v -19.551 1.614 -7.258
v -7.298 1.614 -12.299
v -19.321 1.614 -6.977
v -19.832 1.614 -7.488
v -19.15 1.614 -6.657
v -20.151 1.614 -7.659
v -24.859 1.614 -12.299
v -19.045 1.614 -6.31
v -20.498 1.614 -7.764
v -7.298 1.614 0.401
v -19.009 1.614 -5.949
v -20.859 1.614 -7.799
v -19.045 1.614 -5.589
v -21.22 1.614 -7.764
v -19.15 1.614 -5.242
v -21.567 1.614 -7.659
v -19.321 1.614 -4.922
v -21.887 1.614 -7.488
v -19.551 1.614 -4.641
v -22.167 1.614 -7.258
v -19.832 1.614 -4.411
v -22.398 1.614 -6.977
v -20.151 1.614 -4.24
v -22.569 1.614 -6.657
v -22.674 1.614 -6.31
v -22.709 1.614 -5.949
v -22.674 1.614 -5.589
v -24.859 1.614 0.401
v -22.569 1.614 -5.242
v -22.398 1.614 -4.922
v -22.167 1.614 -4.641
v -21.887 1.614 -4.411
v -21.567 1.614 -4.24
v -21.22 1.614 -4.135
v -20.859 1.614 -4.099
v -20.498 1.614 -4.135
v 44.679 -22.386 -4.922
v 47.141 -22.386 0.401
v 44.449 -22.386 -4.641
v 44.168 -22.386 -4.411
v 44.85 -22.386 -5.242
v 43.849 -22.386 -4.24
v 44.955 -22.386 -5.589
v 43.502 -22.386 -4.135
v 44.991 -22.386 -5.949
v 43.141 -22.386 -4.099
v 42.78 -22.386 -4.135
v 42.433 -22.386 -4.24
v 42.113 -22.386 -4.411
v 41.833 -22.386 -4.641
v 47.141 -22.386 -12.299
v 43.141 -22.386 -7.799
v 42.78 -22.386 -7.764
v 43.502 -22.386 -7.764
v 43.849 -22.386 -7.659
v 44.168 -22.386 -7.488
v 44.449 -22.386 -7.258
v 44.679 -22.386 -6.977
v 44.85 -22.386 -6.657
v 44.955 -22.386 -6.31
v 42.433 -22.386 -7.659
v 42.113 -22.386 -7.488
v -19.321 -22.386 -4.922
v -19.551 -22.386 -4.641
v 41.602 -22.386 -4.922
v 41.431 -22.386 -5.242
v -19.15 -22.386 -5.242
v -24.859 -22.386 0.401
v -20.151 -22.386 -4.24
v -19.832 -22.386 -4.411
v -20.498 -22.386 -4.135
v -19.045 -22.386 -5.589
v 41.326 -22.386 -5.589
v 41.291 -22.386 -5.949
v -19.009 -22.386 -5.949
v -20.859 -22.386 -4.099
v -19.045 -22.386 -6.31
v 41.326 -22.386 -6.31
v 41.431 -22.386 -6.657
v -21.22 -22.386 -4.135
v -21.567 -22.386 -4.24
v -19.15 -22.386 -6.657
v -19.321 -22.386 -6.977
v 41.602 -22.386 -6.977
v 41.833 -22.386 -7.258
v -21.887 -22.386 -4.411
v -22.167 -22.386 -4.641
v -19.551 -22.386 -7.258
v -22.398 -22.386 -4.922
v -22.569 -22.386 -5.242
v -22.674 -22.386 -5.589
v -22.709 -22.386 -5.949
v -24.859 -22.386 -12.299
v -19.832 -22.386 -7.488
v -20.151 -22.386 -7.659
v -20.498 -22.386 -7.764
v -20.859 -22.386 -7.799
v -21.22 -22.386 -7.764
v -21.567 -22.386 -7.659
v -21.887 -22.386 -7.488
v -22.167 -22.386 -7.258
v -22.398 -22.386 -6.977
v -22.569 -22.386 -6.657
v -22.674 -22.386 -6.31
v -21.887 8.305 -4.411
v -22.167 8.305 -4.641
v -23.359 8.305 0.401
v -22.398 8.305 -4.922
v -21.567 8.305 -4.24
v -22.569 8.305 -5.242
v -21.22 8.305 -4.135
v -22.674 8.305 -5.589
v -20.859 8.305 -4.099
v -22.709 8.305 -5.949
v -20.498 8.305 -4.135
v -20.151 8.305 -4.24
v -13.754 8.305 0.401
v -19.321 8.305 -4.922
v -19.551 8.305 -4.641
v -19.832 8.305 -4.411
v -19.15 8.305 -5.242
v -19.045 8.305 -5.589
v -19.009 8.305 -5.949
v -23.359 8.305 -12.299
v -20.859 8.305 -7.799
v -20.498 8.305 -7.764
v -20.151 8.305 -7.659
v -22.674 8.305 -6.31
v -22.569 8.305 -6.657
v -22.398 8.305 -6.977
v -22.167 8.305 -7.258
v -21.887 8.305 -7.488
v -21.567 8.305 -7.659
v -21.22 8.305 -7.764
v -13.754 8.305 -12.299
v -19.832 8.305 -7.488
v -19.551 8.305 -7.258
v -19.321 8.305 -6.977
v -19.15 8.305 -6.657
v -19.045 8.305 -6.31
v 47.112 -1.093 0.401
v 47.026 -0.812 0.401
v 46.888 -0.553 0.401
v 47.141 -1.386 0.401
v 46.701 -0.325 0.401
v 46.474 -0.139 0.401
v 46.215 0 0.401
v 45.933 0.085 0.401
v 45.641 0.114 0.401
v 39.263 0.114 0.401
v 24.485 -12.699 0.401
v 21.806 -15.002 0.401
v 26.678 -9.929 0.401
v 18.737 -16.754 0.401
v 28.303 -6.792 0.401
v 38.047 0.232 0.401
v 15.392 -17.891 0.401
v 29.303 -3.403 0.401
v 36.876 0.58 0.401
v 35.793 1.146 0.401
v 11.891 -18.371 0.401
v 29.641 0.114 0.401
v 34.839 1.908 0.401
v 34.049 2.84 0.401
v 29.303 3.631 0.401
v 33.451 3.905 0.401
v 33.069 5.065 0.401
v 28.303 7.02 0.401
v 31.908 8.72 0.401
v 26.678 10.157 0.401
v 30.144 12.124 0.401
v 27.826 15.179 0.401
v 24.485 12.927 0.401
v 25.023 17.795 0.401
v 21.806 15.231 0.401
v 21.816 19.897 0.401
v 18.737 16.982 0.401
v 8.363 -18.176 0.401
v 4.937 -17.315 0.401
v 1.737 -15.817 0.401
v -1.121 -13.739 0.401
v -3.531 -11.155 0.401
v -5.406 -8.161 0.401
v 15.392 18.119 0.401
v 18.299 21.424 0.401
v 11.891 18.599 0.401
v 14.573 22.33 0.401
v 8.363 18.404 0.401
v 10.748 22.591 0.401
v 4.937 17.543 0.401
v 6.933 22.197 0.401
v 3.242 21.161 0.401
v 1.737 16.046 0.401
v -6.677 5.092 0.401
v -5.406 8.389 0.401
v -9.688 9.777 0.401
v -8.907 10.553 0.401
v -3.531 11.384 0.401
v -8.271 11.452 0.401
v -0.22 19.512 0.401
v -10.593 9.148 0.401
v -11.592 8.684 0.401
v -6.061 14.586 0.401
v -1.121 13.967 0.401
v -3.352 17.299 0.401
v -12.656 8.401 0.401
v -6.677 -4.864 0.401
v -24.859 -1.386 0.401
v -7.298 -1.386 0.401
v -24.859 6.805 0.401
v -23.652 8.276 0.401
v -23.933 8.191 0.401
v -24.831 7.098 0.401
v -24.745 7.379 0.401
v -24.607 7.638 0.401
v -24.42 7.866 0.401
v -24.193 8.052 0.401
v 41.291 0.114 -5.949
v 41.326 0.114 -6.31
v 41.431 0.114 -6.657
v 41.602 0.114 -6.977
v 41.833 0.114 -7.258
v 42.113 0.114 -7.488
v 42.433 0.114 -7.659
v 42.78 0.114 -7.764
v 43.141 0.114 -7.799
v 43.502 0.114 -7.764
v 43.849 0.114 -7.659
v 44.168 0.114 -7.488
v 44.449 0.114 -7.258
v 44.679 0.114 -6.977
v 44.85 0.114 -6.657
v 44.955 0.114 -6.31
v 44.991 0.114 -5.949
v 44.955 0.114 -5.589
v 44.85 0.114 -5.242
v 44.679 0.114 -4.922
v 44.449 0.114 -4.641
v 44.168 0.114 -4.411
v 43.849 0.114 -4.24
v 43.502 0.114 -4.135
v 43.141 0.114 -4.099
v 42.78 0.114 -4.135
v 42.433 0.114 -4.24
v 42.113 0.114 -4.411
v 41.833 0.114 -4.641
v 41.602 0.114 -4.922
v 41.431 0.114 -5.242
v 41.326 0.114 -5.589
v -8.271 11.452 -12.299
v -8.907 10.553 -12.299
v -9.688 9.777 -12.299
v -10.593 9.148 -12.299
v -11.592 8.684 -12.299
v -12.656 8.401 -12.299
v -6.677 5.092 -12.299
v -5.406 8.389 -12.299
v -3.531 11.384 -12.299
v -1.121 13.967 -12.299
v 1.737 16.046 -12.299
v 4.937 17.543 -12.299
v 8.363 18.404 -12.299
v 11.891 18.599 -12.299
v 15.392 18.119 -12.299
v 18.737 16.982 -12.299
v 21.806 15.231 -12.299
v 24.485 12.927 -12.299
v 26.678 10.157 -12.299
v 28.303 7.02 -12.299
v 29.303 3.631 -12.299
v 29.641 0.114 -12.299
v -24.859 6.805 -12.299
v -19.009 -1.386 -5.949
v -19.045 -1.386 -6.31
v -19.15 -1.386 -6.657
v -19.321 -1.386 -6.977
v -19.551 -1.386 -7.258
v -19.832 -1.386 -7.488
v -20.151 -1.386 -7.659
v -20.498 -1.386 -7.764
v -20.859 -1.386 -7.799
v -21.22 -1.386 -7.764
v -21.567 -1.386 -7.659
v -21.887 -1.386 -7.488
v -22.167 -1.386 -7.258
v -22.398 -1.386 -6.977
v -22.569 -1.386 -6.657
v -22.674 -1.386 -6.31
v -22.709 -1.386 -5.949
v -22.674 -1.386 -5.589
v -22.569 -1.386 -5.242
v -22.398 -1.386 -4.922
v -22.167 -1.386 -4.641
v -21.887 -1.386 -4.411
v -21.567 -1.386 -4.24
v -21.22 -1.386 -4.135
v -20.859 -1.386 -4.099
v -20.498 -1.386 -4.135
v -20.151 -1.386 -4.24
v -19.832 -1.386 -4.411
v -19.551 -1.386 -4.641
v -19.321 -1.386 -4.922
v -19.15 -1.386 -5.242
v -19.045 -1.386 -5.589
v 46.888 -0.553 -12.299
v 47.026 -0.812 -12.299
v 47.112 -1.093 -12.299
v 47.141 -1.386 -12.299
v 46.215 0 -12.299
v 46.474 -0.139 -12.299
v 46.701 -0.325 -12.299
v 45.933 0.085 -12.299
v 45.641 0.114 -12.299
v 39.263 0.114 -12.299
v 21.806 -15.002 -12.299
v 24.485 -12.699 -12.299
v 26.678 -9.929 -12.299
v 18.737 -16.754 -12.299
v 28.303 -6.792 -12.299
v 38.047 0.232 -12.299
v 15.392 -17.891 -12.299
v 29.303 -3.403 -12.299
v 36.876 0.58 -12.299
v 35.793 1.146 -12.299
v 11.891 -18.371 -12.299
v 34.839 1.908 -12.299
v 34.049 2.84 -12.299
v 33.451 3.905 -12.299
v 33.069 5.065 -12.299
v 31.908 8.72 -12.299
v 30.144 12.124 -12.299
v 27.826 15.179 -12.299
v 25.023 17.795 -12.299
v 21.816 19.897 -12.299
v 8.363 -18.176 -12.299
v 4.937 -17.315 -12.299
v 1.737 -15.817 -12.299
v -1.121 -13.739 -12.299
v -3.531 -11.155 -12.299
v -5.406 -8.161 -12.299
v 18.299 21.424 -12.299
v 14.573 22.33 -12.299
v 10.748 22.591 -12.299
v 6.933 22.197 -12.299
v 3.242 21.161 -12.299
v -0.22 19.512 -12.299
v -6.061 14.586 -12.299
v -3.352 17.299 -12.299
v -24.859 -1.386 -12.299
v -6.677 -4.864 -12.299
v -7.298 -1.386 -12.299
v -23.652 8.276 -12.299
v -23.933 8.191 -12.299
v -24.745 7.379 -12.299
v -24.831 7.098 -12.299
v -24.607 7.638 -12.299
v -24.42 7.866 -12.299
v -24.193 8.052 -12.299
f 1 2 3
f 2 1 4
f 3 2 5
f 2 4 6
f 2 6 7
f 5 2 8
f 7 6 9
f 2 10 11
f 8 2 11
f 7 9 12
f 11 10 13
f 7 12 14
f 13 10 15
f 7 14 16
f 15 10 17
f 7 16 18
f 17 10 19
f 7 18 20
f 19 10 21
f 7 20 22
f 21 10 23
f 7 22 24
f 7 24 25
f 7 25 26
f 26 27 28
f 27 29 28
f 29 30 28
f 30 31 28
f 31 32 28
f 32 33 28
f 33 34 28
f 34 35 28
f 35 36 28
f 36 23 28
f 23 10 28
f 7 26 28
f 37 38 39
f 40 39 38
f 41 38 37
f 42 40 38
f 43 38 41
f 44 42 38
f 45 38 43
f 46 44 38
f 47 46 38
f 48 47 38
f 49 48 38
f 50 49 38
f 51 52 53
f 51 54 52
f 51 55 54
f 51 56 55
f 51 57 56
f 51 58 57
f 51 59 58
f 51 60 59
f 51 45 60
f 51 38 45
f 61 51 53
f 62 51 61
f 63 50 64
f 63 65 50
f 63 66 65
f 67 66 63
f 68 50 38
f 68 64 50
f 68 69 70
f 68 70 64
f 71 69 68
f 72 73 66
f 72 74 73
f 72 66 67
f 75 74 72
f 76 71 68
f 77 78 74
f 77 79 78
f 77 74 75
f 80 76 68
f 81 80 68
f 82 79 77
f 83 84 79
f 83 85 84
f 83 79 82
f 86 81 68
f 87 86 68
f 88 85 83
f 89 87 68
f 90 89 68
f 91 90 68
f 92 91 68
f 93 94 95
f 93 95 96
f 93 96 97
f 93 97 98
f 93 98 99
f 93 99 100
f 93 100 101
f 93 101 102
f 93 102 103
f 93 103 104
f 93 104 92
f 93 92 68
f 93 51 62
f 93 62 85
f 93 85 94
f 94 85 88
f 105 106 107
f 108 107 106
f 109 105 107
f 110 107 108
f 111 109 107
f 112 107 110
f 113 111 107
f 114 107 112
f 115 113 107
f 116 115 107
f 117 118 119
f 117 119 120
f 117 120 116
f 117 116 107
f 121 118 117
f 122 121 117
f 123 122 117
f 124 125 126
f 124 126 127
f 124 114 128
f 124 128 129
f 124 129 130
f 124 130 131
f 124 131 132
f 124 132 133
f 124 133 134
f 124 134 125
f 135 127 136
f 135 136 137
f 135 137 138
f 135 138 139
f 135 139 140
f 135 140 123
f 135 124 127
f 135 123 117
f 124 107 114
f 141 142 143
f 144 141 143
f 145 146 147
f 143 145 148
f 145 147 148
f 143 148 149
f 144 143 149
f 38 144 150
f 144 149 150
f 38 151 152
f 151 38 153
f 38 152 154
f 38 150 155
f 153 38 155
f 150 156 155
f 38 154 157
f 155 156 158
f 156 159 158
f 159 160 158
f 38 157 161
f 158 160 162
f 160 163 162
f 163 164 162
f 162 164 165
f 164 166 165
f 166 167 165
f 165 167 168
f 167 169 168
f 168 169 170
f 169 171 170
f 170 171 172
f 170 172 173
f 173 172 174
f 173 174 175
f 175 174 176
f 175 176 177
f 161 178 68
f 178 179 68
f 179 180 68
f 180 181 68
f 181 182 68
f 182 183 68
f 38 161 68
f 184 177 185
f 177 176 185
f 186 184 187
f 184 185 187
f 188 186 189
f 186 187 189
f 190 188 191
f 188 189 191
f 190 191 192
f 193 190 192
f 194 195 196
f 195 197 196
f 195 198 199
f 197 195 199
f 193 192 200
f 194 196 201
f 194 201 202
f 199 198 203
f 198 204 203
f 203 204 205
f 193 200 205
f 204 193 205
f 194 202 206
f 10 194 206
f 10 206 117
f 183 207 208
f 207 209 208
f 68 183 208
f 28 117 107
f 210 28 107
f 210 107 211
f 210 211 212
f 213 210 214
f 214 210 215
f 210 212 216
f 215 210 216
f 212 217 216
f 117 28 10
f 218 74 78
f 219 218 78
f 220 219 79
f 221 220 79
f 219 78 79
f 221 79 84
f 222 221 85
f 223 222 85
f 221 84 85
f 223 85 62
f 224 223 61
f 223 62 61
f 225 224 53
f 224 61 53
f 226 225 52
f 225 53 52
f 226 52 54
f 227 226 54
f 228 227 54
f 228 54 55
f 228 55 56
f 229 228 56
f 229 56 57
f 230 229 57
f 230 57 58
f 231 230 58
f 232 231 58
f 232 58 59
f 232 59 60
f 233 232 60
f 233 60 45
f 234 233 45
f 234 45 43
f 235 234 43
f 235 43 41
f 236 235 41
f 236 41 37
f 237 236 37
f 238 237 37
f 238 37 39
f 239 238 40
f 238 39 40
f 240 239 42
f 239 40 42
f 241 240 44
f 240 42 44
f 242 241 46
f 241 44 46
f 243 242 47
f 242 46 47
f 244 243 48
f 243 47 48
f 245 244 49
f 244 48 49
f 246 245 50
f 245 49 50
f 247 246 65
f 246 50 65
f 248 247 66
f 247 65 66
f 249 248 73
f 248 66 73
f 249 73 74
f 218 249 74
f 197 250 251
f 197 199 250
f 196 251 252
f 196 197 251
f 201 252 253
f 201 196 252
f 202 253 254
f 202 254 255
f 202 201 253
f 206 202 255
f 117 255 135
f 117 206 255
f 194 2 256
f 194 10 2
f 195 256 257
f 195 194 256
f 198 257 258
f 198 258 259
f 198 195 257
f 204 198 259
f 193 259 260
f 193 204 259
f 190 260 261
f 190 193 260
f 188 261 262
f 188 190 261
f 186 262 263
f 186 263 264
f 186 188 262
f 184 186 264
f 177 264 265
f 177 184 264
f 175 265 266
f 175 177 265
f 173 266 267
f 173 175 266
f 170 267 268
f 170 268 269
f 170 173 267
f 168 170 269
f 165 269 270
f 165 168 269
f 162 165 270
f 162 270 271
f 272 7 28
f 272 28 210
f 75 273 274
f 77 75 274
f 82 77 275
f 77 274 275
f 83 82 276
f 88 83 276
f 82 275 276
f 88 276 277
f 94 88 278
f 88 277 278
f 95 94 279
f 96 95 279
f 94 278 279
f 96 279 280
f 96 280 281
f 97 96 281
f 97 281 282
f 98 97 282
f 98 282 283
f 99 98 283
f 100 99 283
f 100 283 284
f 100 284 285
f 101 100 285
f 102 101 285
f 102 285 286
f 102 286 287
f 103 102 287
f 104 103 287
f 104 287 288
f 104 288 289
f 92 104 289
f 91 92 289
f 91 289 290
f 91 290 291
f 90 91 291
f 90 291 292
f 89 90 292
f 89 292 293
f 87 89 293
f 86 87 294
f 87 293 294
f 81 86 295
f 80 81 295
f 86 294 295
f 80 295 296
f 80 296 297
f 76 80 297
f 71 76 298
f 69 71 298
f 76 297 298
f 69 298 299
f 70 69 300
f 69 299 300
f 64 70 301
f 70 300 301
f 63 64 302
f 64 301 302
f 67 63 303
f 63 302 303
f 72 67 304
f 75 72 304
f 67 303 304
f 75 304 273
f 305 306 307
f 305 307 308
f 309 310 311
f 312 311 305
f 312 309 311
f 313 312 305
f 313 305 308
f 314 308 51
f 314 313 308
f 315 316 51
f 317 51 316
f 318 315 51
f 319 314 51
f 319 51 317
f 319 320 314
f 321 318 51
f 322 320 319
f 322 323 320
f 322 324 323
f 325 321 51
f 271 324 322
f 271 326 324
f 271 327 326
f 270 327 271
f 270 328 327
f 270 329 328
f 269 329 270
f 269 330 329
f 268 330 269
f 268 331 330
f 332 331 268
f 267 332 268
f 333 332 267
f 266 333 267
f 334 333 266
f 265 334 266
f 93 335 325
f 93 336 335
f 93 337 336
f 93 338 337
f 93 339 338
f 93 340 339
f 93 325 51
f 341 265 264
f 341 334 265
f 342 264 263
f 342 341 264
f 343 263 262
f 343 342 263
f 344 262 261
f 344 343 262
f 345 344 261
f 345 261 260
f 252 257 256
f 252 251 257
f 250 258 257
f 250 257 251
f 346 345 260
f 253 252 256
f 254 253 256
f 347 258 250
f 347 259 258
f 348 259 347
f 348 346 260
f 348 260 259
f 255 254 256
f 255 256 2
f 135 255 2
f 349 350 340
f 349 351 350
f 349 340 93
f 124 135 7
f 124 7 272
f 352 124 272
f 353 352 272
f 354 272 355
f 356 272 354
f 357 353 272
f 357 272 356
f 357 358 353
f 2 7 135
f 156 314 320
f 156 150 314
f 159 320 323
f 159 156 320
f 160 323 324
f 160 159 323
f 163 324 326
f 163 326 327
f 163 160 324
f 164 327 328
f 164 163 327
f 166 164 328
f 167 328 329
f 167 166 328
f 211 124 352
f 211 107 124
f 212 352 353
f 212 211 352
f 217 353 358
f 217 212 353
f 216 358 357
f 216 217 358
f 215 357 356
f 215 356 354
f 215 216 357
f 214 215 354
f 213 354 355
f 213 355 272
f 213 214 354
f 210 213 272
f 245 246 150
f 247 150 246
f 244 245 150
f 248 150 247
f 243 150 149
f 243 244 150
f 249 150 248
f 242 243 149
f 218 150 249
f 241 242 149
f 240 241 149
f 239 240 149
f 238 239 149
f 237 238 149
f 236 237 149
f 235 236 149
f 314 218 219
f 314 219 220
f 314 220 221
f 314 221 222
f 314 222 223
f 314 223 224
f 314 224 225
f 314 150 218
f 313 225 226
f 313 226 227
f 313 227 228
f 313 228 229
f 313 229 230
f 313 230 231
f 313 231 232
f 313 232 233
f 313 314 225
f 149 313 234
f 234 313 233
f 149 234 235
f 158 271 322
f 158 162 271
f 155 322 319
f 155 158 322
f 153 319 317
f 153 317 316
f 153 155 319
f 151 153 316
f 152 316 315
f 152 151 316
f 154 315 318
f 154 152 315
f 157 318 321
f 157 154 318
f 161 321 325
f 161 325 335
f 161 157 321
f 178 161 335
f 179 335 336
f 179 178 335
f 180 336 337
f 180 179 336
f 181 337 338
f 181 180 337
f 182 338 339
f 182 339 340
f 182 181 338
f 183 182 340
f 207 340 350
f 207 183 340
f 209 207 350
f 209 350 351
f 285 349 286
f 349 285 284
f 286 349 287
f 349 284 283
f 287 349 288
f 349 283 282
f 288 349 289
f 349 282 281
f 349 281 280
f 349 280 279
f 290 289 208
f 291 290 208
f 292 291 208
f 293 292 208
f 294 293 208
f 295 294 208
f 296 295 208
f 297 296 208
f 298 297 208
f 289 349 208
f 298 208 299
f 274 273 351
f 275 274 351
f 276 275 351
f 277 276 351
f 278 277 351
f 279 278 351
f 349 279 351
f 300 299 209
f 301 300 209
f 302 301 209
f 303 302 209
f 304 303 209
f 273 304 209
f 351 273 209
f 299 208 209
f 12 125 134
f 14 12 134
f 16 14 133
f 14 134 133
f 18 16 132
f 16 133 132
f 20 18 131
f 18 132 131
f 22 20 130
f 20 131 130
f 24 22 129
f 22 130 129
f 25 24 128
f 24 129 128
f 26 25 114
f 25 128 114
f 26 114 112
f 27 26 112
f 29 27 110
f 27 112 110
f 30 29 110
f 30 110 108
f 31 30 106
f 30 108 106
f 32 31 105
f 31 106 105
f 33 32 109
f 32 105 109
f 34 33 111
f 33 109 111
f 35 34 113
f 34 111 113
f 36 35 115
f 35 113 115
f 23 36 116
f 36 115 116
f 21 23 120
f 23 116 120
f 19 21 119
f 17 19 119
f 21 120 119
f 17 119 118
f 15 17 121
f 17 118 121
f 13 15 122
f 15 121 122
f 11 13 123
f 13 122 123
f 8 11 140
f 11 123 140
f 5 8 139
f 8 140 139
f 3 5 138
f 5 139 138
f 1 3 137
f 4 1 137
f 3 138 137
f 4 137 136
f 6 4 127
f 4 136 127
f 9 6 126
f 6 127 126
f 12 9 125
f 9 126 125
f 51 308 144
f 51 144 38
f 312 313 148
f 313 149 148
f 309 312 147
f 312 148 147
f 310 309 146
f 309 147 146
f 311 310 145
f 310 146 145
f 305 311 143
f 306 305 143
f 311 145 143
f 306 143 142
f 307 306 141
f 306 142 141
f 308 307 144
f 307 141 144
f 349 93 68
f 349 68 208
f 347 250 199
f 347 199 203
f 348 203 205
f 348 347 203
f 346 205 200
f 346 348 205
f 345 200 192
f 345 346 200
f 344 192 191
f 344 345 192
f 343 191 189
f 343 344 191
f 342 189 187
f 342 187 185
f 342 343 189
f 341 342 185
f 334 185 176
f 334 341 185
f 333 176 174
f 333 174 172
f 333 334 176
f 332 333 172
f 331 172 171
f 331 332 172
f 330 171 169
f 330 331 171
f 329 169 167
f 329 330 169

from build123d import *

# Parameters (mm, degrees)
BOSS_EXTRUDE1_DEPTH            = 12.7
CUT_EXTRUDE1_DEPTH             = 13.7
SKETCH3_W                      = 18.5
SKETCH3_H                      = 12.7
F_3_7_3_7_DIAMETER_HOLE1_D     = 3.7
F_3_7_3_7_DIAMETER_HOLE1_DEPTH = 22.5
SKETCH6_W                      = 1.85
SKETCH6_H                      = 20.98
F_3_7_3_7_DIAMETER_HOLE3_D     = 3.7
F_3_7_3_7_DIAMETER_HOLE3_DEPTH = 44.98
FILLET1_R                      = 1.5
FILLET2_R                      = 6.35


with BuildPart() as part:
    # Sketch1 → Boss-Extrude1 (new body)
    with BuildSketch(Plane(origin=(0, 0, -12.299495873), x_dir=(-1, 0, 0), z_dir=(0, 0, -1))):
        with BuildLine():
            Line((24.859325054, -22.385915399), (24.859325054, 8.305102167))
            Line((24.859325054, 8.305102167), (9.793928734, 8.305102167))
            ThreePointArc((9.793928734, 8.305102167), (-15.308438691, 22.204357242), (-33.620674946, 0.114084601))
            Line((-33.620674946, 0.114084601), (-47.140674946, 0.114084601))
            Line((-47.140674946, 0.114084601), (-47.140674946, -22.385915399))
            Line((-47.140674946, -22.385915399), (24.859325054, -22.385915399))
        make_face()
    extrude(amount=-BOSS_EXTRUDE1_DEPTH)

    # Sketch2 → Cut-Extrude1 (cut, through all)
    with BuildSketch(Plane.XY.offset(0.400504127)):
        with BuildLine():
            Line((-24.859325054, 1.614084601), (-24.859325054, -1.385915399))
            Line((-24.859325054, -1.385915399), (-7.298413969, -1.385915399))
            ThreePointArc((-7.298413969, -1.385915399), (-7.359325054, 0.114084601), (-7.298413969, 1.614084601))
            Line((-7.298413969, 1.614084601), (-24.859325054, 1.614084601))
        make_face()
    extrude(amount=-CUT_EXTRUDE1_DEPTH, mode=Mode.SUBTRACT)

    # Sketch3 → Cut-Revolve1 (revolve, cut)
    with BuildSketch(Plane.XZ.offset(-0.114084601)):
        with Locations((20.390674946, -5.949495873)):
            Rectangle(SKETCH3_W, SKETCH3_H)
    revolve(axis=Axis((11.140674946, 0.114084601, 0.400504127), (0, 0, -1)), mode=Mode.SUBTRACT)

    # Ø3.7 (3.7) Diameter Hole1
    with Locations(Plane(origin=(0, 0.114084601, 0), x_dir=(1, 0, 0), z_dir=(0, 1, 0))):
        with Locations((43.140674946, 5.949495873)):
            Hole(F_3_7_3_7_DIAMETER_HOLE1_D / 2, depth=F_3_7_3_7_DIAMETER_HOLE1_DEPTH)

    # Sketch6 → Ø3.7 (3.7) Diameter Hole2 (revolve, cut)
    with BuildSketch(Plane(origin=(-20.859325054, 1.614084601, -5.949495873), x_dir=(0, 0, -1), z_dir=(1, 0, 0))):
        with Locations((0.925, 10.49)):
            Rectangle(SKETCH6_W, SKETCH6_H)
    revolve(axis=Axis((-20.859325054, -4.735915399, -5.949495873), (0, 1, 0)), mode=Mode.SUBTRACT)

    # Ø3.7 (3.7) Diameter Hole3
    with Locations(Plane(origin=(0, -22.385915399, 0), x_dir=(-1, 0, 0), z_dir=(0, -1, 0))):
        with Locations((20.859325054, 5.949495873)):
            Hole(F_3_7_3_7_DIAMETER_HOLE3_D / 2, depth=F_3_7_3_7_DIAMETER_HOLE3_DEPTH)

    # Fillet1
    fillet1_edges = [part.edges().sort_by_distance(p)[0] for p in [
        (47.140674946, 0.114084601, -5.949495873),
        (-24.859325054, 8.305102167, -5.949495873),
    ]]
    fillet(fillet1_edges, radius=FILLET1_R)

    # Fillet2
    fillet2_edges = [part.edges().sort_by_distance(p)[0] for p in [
        (33.620674946, 0.114084601, -5.949495873),
        (-9.793928734, 8.305102167, -5.949495873),
    ]]
    fillet(fillet2_edges, radius=FILLET2_R)


solid = part.part
